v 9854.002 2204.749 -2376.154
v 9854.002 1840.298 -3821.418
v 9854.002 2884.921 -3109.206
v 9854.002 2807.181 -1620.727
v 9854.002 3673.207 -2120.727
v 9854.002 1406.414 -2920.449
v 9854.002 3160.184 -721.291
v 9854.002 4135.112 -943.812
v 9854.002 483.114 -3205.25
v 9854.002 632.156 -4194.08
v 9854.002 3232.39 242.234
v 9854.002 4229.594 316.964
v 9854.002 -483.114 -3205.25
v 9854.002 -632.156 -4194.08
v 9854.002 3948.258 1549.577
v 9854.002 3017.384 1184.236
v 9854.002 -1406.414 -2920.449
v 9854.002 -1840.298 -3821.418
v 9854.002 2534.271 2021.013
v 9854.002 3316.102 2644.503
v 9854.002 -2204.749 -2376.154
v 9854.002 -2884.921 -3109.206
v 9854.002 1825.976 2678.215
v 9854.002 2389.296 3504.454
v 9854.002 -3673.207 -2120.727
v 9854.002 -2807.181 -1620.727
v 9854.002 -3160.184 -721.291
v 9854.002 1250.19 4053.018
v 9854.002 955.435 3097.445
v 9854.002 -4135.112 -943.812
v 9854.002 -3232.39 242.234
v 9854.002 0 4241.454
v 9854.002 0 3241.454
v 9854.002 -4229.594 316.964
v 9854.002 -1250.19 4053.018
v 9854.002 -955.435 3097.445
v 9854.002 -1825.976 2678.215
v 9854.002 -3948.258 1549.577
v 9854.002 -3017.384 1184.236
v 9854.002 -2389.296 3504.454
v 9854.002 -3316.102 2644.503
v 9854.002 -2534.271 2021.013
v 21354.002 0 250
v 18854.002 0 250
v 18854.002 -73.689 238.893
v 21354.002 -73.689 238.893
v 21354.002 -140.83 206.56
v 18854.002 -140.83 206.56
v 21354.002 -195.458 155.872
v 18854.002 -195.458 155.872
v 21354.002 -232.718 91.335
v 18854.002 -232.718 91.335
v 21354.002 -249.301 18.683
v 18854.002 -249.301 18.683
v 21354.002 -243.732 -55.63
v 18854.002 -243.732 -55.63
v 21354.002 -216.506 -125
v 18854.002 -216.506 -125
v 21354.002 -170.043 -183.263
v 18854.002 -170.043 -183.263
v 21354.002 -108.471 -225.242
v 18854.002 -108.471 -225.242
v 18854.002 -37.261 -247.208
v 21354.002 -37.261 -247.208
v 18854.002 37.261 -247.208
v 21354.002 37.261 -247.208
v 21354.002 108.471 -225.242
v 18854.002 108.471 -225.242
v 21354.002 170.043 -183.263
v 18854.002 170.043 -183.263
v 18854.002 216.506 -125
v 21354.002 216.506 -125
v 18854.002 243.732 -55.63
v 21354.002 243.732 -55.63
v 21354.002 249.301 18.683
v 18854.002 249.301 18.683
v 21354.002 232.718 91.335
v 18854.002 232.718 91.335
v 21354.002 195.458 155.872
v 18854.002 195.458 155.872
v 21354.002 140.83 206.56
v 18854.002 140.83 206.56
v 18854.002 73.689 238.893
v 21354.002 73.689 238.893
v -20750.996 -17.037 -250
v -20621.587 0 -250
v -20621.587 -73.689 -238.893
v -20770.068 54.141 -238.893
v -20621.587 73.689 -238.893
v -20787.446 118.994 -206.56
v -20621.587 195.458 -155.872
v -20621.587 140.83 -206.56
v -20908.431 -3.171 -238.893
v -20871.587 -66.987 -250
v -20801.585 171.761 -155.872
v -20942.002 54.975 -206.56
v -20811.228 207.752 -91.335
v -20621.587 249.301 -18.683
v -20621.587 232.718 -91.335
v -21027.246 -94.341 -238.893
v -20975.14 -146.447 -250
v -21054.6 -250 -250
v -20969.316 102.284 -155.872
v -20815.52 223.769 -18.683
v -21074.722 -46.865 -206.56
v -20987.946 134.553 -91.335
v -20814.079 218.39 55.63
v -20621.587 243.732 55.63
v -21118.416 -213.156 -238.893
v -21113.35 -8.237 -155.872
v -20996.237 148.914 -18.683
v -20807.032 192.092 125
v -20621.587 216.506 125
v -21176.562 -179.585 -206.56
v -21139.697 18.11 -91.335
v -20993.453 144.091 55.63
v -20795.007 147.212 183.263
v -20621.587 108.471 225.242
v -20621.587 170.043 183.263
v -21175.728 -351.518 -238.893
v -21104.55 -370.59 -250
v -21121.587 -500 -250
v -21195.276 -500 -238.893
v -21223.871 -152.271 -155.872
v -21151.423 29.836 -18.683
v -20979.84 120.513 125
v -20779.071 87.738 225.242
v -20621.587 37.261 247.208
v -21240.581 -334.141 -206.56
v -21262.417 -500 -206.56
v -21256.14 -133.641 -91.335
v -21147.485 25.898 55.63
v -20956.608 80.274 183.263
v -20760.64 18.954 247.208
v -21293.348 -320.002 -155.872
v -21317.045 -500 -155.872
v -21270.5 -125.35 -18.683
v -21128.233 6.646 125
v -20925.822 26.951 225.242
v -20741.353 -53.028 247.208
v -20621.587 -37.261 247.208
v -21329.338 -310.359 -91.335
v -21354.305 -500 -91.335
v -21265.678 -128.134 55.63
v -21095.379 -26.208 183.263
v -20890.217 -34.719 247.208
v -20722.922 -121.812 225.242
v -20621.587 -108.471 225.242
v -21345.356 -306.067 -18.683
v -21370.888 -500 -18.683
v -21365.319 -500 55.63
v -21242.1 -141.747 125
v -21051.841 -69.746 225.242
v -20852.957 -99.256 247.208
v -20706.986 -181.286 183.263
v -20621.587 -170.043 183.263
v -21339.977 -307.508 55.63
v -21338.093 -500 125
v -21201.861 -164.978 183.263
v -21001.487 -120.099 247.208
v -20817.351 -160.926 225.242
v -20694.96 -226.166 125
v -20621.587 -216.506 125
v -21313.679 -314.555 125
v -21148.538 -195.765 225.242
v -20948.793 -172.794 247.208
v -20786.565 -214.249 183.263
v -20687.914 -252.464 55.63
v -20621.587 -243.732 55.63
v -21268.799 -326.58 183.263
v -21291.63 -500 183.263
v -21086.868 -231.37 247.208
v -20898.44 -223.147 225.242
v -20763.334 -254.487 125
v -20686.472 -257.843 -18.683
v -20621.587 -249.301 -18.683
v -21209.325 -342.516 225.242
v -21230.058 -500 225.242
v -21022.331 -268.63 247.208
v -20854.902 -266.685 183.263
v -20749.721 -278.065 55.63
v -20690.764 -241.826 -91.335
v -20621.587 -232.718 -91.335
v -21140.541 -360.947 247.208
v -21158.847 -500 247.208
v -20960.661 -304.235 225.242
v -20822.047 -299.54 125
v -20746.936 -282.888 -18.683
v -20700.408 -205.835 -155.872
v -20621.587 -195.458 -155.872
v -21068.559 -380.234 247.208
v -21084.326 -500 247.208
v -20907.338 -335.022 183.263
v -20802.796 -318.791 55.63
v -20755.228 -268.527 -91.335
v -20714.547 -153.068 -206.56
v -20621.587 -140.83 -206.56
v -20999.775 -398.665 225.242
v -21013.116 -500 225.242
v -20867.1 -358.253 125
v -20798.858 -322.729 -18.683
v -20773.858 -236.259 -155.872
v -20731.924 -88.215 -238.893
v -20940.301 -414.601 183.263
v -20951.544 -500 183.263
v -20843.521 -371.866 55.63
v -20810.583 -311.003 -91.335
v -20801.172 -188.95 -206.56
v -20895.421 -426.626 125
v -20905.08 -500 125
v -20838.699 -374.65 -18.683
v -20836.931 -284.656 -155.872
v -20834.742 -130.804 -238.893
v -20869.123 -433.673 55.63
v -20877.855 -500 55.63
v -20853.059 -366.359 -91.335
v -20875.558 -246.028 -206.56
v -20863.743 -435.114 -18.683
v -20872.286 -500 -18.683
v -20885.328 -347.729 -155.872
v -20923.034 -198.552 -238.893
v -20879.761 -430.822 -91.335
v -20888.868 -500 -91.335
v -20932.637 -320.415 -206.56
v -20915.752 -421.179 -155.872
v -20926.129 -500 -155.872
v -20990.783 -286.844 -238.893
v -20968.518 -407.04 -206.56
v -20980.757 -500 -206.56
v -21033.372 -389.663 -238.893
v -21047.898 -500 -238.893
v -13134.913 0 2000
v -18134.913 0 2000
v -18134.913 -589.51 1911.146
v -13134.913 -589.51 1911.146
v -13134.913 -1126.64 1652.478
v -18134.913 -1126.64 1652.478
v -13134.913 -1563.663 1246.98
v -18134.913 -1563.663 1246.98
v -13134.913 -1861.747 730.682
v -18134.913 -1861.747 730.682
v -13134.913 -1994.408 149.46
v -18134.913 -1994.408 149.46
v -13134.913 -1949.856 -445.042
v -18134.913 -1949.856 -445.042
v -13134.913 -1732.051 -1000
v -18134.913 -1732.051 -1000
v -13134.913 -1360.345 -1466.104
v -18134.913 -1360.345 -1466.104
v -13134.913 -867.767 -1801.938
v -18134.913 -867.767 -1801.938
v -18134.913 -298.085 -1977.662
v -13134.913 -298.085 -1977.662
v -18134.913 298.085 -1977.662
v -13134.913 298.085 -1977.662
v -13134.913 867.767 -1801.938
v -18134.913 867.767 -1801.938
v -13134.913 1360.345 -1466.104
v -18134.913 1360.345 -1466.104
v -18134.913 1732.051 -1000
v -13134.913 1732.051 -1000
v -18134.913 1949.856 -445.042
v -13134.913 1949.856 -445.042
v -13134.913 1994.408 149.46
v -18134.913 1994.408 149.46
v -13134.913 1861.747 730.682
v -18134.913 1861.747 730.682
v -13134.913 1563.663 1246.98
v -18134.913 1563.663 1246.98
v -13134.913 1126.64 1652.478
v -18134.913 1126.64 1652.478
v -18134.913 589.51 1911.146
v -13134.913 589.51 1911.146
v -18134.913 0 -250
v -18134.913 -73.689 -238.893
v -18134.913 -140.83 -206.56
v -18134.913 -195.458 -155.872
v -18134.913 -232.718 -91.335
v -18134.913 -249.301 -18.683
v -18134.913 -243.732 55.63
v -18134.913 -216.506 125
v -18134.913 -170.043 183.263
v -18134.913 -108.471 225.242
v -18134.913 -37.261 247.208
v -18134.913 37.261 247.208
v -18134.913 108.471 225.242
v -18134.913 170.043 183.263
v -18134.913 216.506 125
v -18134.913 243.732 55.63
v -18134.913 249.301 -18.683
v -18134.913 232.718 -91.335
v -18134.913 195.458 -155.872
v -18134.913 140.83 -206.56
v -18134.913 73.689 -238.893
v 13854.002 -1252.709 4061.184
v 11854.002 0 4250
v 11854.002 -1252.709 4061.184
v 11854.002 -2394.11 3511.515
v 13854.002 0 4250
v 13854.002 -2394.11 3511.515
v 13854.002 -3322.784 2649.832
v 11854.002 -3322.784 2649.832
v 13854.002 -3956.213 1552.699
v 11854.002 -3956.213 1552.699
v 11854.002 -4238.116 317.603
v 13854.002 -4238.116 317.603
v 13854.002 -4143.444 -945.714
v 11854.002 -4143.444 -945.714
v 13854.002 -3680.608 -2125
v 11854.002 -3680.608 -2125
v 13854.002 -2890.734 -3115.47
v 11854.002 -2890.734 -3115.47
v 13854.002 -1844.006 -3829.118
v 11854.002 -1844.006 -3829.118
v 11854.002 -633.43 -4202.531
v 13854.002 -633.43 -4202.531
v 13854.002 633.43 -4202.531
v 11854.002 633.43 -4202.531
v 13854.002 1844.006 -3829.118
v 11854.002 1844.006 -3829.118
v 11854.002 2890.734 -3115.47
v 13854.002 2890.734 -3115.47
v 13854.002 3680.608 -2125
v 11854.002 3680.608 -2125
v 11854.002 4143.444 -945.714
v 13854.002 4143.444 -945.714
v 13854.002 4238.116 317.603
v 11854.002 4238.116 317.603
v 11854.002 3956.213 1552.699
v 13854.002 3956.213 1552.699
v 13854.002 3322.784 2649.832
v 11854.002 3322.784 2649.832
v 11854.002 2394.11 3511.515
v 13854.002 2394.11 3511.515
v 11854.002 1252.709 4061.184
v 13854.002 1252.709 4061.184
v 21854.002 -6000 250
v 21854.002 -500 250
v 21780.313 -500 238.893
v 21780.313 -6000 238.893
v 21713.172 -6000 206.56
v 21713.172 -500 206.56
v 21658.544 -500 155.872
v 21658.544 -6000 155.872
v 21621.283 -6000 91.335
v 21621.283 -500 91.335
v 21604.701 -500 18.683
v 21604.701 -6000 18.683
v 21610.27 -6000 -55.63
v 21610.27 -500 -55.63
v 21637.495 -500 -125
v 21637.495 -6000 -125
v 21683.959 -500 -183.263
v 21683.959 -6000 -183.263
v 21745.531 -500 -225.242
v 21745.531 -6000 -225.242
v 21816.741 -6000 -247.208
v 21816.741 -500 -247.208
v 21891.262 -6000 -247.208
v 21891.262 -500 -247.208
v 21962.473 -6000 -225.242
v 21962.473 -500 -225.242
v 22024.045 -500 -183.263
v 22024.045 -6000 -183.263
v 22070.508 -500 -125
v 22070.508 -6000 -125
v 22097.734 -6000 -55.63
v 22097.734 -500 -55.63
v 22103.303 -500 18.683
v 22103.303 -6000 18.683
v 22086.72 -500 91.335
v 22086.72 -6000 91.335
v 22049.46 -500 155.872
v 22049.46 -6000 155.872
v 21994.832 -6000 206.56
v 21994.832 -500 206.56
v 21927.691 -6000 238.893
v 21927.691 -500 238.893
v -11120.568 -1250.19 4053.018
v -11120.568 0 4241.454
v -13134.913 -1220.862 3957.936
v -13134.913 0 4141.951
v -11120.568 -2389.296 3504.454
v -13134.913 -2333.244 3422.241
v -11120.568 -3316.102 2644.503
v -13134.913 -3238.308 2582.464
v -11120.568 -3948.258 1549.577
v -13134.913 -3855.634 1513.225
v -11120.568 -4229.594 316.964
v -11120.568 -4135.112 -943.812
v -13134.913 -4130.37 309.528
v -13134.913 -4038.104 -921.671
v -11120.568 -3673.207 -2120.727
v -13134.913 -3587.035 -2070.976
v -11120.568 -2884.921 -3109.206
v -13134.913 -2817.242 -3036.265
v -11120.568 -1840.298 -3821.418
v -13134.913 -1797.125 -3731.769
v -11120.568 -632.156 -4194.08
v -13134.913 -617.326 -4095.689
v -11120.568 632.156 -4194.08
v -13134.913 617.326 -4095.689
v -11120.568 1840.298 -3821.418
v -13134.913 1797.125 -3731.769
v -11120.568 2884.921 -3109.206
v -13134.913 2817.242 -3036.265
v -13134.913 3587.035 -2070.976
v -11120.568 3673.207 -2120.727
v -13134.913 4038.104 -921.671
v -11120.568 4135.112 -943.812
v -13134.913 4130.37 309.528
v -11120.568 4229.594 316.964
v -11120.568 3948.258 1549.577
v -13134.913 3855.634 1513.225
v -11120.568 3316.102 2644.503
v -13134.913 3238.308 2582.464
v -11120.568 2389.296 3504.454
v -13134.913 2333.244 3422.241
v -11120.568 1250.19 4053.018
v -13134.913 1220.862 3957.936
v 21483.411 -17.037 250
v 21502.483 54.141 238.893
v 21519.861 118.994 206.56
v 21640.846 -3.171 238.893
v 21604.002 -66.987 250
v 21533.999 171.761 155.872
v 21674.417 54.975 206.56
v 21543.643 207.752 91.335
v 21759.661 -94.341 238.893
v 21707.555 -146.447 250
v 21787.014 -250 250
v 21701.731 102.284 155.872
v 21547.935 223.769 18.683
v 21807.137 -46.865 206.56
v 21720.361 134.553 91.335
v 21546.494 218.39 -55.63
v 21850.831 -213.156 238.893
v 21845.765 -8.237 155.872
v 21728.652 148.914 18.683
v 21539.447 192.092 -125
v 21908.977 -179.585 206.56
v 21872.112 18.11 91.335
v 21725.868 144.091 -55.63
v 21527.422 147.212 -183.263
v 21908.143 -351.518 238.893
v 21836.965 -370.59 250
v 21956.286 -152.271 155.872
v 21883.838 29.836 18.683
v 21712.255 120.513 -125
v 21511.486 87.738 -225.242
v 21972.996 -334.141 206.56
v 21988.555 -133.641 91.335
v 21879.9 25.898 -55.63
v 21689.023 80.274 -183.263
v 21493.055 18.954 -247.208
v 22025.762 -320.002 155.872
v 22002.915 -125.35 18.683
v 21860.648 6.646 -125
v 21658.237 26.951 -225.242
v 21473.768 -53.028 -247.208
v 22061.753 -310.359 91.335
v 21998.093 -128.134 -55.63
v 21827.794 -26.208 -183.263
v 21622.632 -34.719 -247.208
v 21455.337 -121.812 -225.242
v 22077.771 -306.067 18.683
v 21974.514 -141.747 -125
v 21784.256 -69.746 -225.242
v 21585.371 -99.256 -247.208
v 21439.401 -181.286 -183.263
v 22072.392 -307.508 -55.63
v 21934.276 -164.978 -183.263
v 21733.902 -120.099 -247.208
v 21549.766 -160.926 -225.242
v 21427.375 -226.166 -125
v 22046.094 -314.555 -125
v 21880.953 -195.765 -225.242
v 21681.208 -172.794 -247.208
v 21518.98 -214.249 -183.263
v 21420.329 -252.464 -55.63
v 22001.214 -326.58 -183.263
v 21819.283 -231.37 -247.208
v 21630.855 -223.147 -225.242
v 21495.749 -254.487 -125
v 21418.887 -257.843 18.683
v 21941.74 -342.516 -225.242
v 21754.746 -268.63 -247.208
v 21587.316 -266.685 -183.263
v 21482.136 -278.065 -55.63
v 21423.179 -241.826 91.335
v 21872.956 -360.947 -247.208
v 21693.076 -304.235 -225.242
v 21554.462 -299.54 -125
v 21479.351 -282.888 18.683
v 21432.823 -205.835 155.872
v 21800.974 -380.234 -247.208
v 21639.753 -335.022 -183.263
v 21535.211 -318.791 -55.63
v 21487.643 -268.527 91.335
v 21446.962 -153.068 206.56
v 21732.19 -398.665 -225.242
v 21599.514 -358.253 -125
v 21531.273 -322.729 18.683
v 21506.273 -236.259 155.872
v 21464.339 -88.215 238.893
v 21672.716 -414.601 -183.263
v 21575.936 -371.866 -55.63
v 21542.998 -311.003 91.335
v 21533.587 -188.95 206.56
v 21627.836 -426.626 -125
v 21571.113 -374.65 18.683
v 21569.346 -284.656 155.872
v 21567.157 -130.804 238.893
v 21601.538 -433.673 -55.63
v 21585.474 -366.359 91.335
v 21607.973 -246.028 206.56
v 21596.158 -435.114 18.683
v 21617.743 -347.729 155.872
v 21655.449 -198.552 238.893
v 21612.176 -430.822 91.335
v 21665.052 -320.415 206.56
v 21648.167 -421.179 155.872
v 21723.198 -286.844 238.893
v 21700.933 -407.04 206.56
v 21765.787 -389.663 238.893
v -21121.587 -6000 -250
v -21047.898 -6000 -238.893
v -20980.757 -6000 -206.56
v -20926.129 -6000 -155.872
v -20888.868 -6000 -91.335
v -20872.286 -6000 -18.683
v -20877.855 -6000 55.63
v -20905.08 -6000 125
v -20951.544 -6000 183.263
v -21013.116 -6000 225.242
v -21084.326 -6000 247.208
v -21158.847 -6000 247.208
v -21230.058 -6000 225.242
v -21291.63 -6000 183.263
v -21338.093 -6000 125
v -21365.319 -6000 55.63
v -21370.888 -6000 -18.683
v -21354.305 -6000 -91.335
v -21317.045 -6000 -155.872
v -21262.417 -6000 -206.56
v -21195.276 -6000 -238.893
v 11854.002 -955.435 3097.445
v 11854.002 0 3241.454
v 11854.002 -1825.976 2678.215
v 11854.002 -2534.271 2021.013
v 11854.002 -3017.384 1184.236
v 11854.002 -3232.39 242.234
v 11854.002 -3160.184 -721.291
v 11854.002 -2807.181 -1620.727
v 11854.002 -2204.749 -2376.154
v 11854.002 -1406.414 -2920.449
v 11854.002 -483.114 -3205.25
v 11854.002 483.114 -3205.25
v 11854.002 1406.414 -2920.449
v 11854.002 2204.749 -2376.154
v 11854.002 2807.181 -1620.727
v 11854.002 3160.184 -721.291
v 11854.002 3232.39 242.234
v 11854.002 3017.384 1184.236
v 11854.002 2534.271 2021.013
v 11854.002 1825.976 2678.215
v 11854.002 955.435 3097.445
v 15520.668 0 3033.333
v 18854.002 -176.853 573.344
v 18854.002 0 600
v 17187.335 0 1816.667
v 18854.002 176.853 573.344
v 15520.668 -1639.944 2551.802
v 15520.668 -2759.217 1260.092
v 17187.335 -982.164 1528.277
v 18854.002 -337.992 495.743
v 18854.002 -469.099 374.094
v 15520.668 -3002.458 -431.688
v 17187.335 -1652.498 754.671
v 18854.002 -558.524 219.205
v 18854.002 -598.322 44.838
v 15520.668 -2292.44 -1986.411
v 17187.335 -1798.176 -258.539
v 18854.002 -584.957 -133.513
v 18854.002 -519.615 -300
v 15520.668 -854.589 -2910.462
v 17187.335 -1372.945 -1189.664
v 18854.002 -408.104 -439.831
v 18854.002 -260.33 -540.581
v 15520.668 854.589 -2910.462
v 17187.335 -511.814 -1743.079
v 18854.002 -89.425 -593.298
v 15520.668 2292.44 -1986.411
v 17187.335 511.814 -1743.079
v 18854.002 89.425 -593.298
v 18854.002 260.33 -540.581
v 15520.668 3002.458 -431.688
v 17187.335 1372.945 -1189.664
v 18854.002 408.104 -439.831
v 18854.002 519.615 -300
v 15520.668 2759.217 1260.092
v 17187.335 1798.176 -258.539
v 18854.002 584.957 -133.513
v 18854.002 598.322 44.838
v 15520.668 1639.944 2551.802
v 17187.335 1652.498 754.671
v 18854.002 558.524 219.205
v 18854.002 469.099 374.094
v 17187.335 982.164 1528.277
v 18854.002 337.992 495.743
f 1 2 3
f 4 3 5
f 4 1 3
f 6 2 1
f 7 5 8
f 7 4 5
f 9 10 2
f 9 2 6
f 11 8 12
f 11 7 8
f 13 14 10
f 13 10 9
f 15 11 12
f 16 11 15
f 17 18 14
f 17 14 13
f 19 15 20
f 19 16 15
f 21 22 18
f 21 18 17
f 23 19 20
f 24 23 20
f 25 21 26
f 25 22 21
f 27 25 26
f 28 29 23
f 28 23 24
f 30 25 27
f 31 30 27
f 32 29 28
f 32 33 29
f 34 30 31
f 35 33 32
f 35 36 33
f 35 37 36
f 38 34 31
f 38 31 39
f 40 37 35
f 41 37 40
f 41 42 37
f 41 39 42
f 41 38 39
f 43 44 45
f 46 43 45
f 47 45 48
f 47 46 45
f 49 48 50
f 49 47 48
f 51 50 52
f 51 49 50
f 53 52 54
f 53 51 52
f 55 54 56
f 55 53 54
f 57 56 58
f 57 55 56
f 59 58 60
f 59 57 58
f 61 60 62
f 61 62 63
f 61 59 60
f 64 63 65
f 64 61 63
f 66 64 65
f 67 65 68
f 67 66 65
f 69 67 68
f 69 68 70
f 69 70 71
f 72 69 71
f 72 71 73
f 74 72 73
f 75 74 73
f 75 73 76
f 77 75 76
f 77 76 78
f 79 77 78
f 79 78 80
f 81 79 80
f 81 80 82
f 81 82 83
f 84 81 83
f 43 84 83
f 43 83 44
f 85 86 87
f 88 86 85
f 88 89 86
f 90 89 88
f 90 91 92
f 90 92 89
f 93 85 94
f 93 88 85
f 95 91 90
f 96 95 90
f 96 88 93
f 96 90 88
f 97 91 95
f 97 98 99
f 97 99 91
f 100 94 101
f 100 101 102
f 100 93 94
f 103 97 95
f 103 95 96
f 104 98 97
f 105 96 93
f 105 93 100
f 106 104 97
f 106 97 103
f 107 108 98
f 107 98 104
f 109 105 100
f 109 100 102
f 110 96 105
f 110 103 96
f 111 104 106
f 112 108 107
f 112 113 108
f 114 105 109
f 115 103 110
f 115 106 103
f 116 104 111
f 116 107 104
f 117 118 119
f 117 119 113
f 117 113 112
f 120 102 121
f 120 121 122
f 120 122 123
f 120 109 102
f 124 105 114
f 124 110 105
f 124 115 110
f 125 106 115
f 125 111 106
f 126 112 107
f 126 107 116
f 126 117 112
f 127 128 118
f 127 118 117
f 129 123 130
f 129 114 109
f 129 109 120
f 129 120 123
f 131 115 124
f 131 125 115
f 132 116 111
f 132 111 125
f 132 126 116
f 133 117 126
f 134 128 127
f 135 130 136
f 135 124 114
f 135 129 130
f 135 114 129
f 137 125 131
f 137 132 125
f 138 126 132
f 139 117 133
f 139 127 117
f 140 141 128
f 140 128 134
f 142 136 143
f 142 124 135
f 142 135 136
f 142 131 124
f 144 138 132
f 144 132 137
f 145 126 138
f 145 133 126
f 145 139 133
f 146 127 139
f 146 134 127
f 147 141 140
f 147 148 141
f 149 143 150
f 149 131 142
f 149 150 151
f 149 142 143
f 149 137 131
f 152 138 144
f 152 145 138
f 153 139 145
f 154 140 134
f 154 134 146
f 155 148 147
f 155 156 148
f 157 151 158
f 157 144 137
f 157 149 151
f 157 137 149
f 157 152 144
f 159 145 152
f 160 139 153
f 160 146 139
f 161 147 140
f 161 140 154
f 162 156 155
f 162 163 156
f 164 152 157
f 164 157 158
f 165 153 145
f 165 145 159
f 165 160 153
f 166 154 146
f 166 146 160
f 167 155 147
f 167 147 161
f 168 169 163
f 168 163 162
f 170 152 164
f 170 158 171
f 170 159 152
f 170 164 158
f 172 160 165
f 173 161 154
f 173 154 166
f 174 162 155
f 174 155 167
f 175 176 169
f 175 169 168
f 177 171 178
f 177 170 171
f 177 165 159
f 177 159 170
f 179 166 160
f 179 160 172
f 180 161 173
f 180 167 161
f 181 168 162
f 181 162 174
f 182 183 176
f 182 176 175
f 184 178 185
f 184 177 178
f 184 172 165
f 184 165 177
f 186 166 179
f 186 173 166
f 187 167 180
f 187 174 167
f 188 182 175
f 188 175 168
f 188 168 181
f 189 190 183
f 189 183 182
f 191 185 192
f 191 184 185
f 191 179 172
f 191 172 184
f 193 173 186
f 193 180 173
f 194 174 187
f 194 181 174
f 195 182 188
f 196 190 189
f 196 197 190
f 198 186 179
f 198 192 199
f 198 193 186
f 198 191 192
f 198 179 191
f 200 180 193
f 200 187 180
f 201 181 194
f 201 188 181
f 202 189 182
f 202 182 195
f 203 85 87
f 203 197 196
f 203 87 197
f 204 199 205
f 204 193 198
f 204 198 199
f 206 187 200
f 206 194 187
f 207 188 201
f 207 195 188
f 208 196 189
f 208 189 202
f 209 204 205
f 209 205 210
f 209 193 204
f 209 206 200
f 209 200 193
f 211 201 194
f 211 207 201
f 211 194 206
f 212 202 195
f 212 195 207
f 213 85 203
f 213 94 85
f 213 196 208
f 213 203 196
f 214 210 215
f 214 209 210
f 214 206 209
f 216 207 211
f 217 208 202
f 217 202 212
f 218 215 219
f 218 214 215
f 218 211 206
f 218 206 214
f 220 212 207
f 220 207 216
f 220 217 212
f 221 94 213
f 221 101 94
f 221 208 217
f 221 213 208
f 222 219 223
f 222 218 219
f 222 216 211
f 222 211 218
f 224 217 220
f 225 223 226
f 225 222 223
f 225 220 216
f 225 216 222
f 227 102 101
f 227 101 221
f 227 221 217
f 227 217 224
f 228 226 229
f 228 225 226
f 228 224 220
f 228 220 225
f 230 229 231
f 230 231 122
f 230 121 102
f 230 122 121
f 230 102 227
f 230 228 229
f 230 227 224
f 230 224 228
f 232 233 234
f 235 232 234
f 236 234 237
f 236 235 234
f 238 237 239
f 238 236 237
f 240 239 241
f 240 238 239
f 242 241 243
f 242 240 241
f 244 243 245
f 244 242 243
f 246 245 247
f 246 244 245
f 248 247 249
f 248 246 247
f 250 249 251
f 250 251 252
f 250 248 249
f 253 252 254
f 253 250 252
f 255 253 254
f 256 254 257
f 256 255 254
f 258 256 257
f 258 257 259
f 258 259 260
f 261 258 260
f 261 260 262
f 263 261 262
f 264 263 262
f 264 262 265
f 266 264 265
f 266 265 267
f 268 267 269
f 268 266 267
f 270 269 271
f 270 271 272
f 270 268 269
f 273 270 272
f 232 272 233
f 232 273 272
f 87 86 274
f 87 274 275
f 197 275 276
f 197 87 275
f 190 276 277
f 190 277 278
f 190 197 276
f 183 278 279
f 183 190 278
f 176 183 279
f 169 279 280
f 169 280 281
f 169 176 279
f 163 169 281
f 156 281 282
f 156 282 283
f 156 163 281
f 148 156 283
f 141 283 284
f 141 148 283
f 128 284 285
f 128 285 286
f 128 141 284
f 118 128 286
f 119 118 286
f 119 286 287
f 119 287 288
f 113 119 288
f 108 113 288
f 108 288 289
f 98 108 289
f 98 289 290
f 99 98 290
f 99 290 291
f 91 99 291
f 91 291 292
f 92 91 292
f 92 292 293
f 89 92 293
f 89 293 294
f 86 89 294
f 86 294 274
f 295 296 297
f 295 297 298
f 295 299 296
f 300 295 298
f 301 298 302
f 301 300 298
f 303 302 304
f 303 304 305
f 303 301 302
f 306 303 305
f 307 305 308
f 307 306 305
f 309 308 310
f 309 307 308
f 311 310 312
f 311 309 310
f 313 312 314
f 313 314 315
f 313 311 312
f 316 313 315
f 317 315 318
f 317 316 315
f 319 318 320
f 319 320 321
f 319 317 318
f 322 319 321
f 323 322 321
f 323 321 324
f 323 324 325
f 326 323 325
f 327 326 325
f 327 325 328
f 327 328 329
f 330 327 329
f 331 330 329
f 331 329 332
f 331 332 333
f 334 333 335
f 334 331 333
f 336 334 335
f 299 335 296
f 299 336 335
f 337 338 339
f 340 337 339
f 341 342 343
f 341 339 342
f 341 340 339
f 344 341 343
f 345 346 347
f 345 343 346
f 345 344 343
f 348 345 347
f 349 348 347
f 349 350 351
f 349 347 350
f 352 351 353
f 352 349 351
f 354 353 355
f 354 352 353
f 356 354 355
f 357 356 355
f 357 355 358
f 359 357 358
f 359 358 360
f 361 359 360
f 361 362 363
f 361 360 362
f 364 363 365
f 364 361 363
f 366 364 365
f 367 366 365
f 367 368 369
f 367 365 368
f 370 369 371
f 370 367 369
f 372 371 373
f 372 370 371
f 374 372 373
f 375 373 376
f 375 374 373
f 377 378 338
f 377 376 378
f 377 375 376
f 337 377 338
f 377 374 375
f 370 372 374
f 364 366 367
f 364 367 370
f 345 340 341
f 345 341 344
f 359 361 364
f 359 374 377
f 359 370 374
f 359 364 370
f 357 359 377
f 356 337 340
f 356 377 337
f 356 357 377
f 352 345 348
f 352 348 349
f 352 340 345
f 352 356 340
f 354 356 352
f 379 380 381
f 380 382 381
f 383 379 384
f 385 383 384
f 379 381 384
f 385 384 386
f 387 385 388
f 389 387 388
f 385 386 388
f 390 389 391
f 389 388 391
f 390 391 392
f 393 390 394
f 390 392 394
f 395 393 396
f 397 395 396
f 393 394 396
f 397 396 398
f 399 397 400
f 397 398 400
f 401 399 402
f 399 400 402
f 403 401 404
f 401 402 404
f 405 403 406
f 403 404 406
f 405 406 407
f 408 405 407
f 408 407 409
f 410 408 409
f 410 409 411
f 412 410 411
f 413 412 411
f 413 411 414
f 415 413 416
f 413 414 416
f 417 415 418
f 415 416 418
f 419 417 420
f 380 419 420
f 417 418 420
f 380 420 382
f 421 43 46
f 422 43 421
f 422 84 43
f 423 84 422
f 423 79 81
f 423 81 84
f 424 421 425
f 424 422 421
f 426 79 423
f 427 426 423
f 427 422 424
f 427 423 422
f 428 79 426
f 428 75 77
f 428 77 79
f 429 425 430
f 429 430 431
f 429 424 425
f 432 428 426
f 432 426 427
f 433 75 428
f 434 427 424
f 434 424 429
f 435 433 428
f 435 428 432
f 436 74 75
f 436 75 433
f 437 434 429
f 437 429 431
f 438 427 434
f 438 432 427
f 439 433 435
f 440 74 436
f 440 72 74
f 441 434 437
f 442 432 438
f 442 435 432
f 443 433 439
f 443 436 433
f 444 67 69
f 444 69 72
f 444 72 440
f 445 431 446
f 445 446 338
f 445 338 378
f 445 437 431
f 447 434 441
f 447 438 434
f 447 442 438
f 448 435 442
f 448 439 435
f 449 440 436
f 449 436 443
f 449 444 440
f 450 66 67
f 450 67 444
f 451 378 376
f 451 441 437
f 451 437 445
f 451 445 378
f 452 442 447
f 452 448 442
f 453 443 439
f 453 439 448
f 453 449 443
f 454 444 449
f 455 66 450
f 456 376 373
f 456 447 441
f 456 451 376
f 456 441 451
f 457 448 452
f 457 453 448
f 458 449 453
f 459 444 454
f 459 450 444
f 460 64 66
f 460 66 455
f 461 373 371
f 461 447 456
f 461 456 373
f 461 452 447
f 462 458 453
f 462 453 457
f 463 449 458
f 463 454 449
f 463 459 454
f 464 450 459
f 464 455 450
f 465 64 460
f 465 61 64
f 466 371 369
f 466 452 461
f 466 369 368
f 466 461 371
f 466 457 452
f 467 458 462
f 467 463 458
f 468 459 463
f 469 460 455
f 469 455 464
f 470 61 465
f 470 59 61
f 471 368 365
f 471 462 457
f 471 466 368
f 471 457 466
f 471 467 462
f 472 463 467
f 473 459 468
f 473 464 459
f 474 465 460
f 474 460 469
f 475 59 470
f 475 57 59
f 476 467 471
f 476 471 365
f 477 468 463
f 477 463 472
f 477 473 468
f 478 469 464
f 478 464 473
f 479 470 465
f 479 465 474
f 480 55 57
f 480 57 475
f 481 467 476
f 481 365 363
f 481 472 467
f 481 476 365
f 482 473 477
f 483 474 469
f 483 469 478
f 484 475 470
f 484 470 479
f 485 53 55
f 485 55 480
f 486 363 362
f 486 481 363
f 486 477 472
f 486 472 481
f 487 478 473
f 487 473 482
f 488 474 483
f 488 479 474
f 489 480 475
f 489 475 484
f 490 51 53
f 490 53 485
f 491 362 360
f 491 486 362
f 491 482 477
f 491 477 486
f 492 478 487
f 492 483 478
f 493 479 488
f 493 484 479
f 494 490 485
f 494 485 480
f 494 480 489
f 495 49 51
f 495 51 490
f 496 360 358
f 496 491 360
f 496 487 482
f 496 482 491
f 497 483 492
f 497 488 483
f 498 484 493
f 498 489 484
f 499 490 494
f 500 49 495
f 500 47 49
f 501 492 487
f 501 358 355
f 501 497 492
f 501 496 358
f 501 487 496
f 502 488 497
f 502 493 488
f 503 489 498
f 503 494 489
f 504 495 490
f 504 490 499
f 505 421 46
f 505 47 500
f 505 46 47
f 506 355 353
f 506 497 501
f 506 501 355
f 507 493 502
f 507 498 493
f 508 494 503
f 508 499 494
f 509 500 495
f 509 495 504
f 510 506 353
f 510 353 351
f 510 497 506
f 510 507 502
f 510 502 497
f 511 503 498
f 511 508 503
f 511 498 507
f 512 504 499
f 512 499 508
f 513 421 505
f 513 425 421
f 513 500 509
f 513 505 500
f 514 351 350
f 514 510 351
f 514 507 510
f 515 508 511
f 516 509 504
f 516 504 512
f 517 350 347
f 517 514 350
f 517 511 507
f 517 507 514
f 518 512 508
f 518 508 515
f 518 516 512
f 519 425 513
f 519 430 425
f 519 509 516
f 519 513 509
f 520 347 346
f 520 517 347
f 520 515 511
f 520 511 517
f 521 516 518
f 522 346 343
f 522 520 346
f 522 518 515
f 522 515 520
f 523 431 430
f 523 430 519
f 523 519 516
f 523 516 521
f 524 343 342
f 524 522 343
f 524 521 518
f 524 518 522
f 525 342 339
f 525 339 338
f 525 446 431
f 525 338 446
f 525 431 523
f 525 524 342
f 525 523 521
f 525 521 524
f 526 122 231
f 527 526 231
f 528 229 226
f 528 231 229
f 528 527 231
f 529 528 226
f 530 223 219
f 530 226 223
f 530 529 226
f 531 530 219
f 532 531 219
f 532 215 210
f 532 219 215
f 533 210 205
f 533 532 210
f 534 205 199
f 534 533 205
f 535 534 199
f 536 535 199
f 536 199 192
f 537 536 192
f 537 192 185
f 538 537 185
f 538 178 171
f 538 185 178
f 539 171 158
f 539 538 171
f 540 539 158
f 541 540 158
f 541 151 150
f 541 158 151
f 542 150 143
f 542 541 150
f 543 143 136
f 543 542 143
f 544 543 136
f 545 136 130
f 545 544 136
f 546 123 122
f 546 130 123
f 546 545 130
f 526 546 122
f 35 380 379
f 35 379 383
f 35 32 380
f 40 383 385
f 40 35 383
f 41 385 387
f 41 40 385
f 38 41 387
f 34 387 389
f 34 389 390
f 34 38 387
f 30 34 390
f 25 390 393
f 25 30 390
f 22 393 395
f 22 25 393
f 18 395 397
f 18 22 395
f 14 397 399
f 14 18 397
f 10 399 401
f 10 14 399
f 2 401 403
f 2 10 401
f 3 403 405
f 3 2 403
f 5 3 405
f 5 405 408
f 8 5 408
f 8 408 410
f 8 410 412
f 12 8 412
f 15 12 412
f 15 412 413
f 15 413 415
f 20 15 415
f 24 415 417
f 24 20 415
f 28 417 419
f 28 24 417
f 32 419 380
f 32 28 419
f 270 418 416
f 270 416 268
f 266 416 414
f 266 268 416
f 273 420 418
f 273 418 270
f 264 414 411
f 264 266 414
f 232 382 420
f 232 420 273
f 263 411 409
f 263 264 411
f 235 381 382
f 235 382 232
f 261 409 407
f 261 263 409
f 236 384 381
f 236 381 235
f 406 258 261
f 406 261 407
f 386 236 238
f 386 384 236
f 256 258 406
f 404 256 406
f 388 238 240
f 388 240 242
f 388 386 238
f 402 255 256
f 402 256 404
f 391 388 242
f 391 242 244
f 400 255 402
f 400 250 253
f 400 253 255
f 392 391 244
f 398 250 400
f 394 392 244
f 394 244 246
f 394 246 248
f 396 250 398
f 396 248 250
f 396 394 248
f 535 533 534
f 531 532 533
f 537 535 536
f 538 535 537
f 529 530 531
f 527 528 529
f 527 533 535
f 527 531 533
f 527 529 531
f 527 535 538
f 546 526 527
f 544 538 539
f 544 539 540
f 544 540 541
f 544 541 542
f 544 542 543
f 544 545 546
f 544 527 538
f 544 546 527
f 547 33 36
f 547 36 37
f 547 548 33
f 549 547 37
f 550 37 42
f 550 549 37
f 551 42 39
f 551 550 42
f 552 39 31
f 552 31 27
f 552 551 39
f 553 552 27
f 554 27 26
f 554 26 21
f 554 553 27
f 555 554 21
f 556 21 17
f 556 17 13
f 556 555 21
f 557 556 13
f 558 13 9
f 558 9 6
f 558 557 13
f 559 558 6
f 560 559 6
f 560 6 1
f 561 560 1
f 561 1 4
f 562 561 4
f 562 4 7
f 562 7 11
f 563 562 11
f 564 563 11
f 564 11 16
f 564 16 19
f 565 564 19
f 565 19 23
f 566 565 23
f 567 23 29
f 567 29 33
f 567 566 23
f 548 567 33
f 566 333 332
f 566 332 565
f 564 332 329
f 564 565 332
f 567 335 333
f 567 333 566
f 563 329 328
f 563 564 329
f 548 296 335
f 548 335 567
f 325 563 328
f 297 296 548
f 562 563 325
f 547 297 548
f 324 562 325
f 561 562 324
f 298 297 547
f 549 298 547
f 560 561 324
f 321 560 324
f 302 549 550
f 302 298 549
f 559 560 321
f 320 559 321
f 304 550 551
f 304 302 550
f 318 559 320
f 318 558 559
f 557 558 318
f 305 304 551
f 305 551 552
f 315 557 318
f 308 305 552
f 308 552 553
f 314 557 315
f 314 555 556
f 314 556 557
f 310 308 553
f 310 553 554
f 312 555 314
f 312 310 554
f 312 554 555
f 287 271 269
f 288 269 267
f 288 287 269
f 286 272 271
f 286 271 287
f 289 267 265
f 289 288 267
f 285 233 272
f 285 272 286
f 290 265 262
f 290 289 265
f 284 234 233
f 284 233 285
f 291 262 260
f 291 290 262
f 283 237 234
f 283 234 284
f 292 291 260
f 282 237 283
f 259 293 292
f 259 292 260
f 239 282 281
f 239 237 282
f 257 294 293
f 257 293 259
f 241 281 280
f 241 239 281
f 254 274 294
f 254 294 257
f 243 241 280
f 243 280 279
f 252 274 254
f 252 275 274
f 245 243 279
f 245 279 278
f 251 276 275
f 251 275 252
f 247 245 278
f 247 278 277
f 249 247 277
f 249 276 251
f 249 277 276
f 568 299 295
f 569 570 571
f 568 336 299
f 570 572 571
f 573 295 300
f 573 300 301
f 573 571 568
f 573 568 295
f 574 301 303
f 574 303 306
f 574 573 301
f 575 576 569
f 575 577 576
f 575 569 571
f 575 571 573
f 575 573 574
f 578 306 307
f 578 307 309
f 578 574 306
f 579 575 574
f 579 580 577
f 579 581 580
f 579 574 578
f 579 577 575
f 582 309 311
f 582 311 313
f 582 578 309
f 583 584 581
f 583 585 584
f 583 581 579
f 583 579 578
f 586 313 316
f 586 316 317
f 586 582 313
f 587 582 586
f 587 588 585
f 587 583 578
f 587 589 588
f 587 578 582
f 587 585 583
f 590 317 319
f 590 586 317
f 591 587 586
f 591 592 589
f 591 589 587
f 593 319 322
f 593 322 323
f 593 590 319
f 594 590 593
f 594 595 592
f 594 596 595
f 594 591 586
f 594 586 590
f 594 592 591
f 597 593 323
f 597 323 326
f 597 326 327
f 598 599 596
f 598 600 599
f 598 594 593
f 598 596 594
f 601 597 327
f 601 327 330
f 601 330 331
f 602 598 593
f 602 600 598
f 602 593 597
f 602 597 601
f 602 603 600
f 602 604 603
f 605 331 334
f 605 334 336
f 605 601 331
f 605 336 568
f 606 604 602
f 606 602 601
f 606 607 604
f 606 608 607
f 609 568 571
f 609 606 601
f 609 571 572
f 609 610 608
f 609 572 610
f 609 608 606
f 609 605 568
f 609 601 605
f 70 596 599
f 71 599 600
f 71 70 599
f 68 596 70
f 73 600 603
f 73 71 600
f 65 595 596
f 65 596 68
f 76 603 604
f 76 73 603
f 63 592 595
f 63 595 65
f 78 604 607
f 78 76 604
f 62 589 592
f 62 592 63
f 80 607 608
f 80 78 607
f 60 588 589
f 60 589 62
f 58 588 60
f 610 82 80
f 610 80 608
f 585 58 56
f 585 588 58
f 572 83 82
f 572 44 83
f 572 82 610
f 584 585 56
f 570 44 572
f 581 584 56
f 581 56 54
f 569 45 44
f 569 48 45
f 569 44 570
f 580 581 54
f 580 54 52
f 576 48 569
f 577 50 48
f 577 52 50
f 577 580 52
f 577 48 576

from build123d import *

# Parameters (mm, degrees)
SWEEP7_PROFILE_R = 250
SWEEP8_PROFILE_R = 250


with BuildPart() as part:
    # Sweep7: sweep along a path in Sketch3
    with BuildLine(Plane.XY) as sweep7_path:
        Line((18854.001725824, 0), (21354.001725824, 0))
        ThreePointArc((21354.001725824, 0), (21707.555116417, -146.446609407), (21854.001725824, -500))
        Line((21854.001725824, -500), (21854.001725824, -6000))
    # Sweep7 profile (on start of the path) → Sweep7 (sweep)
    with BuildSketch(Plane(origin=(18854.001725824, 0, 0), x_dir=(0, 0, 1), z_dir=(1, 0, 0))):
        Circle(SWEEP7_PROFILE_R)
    sweep(path=sweep7_path.line)



with BuildPart() as body_2:
    # Sweep8: sweep along a path in Sketch6
    with BuildLine(Plane.XY) as sweep8_path:
        Line((-18134.91260846, 0), (-20621.58680634, 0))
        ThreePointArc((-20621.58680634, 0), (-20975.140196933, -146.446609407), (-21121.58680634, -500))
        Line((-21121.58680634, -500), (-21121.58680634, -6000))
    # Sweep8 profile (on start of the path) → Sweep8 (sweep)
    with BuildSketch(Plane(origin=(-18134.91260846, 0, 0), x_dir=(0, 0, -1), z_dir=(-1, 0, 0))):
        Circle(SWEEP8_PROFILE_R)
    sweep(path=sweep8_path.line)


with BuildPart() as part_1:
    add(part.part)

    add(body_2.part)  # Revolve2 merges body 2
    # Sketch1 one side → Revolve2 (revolve)
    with BuildSketch(Plane(origin=(0, 0, 0), x_dir=(1, 0, 0), z_dir=(0, 1, 0))):
        with BuildLine():
            add(Edge.make_bspline(
                [(-11120.568434243, -4241.453892715), (-12129.425967311, -4249.987121585), (-13134.91260846, -4141.951449371)],
                knots=[0, 0, 0, 1, 1, 1], degree=2))
            Line((-11120.568434243, -4241.453892715), (9854.001725824, -4241.453892715))
            Line((9854.001725824, -4241.453892715), (9854.001725824, -3241.453892715))
            Line((9854.001725824, -3241.453892715), (11854.001725824, -3241.453892715))
            Line((11854.001725824, -3241.453892715), (11854.001725824, -4250))
            Line((11854.001725824, -4250), (13854.001725824, -4250))
            Line((13854.001725824, -4250), (18854.001725824, -600))
            Line((18854.001725824, -600), (18854.001725824, 0))
            Line((18854.001725824, 0), (-18134.91260846, 0))
            Line((-18134.91260846, 0), (-18134.91260846, -2000))
            Line((-18134.91260846, -2000), (-13134.91260846, -2000))
            Line((-13134.91260846, -2000), (-13134.91260846, -4141.951449371))
        make_face()
    revolve(axis=Axis((-24280.039694843, 0, 0), (1, 0, 0)))


solid = part_1.part
